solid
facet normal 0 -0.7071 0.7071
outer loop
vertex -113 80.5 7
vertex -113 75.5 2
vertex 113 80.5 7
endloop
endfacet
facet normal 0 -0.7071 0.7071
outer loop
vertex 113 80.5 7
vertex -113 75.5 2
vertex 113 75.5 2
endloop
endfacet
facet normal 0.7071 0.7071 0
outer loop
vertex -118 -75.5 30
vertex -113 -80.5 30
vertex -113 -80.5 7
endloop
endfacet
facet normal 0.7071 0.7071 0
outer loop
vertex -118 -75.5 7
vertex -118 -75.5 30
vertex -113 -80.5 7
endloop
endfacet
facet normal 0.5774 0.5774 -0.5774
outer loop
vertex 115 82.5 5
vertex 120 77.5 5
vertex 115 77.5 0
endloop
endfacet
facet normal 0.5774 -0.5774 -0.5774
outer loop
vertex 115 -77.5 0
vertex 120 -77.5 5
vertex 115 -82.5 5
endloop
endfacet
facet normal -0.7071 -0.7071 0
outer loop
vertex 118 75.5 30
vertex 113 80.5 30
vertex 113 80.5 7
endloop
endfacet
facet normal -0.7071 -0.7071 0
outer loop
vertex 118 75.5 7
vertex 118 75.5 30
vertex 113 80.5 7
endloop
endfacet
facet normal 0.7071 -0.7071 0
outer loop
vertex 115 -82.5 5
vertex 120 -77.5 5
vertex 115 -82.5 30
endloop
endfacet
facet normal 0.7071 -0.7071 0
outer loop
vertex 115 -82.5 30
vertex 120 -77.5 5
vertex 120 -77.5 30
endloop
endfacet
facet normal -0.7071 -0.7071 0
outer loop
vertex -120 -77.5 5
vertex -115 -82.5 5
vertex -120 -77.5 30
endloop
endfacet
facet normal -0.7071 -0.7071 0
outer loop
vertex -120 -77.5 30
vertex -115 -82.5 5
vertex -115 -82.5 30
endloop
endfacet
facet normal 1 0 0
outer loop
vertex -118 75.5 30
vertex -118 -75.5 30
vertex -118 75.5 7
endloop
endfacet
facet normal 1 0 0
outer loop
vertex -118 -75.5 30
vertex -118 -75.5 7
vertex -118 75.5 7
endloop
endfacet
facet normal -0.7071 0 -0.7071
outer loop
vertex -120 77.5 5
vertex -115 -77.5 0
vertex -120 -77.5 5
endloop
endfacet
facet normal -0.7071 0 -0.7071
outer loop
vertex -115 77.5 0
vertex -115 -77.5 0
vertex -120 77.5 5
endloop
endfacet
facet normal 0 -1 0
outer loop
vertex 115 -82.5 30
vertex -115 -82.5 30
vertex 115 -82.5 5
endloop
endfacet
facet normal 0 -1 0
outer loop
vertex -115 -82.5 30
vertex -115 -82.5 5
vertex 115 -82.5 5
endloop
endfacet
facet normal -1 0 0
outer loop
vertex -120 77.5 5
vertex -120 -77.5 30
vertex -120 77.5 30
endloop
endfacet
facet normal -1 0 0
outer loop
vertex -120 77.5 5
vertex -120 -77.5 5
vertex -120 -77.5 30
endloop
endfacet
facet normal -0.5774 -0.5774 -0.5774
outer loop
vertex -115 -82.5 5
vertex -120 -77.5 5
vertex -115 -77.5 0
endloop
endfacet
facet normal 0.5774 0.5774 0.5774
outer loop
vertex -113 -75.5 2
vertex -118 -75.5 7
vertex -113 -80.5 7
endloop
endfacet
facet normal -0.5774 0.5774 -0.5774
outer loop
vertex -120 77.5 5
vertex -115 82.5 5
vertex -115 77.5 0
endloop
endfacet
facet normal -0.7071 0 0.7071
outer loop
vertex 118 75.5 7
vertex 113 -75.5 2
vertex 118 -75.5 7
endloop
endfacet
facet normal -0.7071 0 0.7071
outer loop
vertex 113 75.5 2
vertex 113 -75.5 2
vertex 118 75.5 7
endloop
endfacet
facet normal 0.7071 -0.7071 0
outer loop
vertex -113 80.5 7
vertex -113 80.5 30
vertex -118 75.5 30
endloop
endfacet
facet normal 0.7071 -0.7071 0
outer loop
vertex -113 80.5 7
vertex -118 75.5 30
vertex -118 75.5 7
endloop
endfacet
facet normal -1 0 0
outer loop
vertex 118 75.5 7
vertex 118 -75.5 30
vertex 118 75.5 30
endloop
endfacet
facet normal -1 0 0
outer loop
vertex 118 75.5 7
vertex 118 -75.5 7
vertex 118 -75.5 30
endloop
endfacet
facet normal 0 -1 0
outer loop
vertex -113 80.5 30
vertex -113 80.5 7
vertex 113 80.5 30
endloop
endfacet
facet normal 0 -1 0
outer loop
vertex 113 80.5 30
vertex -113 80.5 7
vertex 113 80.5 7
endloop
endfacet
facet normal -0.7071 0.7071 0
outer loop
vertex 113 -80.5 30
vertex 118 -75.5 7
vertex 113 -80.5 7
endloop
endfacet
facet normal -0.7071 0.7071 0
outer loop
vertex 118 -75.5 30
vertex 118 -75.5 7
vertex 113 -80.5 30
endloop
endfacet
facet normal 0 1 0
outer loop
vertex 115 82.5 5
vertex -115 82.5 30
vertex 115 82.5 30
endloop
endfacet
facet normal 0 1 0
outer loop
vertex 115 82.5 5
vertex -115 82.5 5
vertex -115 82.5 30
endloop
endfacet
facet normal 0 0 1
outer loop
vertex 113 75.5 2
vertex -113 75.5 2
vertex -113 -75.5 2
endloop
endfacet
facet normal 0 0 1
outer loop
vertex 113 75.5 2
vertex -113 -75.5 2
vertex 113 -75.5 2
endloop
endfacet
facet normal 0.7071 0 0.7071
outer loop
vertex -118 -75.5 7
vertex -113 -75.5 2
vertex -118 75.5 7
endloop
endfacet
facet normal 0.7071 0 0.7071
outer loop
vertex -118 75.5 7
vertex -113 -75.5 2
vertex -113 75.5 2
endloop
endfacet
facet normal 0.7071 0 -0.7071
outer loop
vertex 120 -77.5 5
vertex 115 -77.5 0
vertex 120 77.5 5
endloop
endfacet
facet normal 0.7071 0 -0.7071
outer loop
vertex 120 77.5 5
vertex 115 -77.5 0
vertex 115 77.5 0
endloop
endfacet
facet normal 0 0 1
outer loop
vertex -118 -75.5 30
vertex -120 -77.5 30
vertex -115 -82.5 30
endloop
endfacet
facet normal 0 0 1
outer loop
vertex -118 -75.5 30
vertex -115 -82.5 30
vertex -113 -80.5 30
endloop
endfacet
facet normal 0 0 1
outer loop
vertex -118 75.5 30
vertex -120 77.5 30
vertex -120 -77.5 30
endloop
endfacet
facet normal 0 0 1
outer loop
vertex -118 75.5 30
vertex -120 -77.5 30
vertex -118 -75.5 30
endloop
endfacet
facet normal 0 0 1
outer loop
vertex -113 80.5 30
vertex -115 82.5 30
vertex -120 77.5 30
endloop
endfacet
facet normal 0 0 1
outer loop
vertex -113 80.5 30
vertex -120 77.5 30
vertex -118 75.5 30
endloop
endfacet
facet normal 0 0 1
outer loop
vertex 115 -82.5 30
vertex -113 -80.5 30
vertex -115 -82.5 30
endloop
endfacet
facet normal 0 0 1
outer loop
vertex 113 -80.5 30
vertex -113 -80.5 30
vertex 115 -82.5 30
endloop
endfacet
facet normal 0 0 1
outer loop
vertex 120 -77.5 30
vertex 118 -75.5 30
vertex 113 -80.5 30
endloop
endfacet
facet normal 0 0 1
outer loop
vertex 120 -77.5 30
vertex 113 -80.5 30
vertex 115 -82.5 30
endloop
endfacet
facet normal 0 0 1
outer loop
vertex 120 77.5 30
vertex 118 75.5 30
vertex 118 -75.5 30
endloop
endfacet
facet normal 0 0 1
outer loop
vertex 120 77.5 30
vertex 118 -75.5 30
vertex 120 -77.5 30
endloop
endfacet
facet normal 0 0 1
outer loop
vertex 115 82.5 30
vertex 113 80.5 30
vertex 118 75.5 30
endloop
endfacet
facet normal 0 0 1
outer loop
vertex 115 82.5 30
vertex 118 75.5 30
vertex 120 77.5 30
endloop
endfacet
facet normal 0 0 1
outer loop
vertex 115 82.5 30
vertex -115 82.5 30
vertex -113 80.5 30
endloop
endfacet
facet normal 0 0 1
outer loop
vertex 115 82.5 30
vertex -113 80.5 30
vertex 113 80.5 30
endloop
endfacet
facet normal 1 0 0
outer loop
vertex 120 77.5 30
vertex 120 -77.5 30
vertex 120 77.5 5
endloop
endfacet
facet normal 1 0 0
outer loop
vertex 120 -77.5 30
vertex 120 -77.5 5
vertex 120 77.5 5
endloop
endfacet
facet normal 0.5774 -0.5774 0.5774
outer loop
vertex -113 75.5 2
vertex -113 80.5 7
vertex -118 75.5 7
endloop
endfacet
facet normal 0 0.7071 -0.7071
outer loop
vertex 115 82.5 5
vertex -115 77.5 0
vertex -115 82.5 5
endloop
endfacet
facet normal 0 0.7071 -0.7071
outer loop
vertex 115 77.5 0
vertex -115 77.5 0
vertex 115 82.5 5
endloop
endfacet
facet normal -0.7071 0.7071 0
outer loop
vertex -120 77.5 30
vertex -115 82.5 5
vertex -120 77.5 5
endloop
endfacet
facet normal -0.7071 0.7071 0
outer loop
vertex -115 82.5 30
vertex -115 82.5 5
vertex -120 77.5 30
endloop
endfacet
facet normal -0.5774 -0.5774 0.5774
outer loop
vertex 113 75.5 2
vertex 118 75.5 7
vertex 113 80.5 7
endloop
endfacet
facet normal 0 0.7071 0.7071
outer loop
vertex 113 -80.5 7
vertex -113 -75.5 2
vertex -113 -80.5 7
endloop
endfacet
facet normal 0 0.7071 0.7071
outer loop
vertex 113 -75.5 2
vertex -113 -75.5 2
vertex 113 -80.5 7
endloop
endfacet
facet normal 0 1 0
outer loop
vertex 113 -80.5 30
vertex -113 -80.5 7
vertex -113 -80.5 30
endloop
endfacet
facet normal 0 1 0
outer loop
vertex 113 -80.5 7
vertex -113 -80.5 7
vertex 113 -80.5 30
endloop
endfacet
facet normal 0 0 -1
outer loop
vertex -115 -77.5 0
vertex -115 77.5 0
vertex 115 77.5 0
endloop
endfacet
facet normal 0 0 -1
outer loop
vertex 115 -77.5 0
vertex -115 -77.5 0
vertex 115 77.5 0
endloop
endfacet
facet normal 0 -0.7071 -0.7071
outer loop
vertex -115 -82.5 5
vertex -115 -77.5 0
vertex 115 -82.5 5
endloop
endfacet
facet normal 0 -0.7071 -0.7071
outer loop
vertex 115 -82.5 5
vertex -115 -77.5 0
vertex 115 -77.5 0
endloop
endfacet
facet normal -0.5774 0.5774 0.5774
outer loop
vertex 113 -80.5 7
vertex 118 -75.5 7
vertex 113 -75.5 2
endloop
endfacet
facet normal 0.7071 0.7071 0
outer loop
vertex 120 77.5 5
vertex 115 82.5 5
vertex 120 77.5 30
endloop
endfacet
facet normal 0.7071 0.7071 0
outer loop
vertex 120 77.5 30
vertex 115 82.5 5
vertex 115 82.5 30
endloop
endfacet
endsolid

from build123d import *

# Parameters (mm, degrees)
F0_W     = 240
F0_H     = 165
F1_DEPTH = 30
F2_T     = -2
F3_SIZE  = 5


with BuildPart() as f1:
    # F0 (on Top) → F1 (new body)
    with BuildSketch(Plane.XY):
        Rectangle(F0_W, F0_H)
    extrude(amount=F1_DEPTH)

    # F2
    f2_openings = [f1.faces().sort_by_distance(p)[0] for p in [
        (0, 0, 30),
    ]]
    offset(amount=F2_T, openings=f2_openings)

    # F3
    f3_edges = [f1.edges().sort_by_distance(p)[0] for p in [
        (-118, 80.5, 16),
        (118, 80.5, 16),
        (-118, -80.5, 16),
        (118, -80.5, 16),
        (120, -82.5, 15),
        (120, 82.5, 15),
        (-120, -82.5, 15),
        (-120, 82.5, 15),
        (120, 0, 0),
        (0, 82.5, 0),
        (-120, 0, 0),
        (0, -82.5, 0),
        (118, 0, 2),
        (0, 80.5, 2),
        (-118, 0, 2),
        (0, -80.5, 2),
    ]]
    chamfer(f3_edges, length=F3_SIZE)


solid = f1.part
